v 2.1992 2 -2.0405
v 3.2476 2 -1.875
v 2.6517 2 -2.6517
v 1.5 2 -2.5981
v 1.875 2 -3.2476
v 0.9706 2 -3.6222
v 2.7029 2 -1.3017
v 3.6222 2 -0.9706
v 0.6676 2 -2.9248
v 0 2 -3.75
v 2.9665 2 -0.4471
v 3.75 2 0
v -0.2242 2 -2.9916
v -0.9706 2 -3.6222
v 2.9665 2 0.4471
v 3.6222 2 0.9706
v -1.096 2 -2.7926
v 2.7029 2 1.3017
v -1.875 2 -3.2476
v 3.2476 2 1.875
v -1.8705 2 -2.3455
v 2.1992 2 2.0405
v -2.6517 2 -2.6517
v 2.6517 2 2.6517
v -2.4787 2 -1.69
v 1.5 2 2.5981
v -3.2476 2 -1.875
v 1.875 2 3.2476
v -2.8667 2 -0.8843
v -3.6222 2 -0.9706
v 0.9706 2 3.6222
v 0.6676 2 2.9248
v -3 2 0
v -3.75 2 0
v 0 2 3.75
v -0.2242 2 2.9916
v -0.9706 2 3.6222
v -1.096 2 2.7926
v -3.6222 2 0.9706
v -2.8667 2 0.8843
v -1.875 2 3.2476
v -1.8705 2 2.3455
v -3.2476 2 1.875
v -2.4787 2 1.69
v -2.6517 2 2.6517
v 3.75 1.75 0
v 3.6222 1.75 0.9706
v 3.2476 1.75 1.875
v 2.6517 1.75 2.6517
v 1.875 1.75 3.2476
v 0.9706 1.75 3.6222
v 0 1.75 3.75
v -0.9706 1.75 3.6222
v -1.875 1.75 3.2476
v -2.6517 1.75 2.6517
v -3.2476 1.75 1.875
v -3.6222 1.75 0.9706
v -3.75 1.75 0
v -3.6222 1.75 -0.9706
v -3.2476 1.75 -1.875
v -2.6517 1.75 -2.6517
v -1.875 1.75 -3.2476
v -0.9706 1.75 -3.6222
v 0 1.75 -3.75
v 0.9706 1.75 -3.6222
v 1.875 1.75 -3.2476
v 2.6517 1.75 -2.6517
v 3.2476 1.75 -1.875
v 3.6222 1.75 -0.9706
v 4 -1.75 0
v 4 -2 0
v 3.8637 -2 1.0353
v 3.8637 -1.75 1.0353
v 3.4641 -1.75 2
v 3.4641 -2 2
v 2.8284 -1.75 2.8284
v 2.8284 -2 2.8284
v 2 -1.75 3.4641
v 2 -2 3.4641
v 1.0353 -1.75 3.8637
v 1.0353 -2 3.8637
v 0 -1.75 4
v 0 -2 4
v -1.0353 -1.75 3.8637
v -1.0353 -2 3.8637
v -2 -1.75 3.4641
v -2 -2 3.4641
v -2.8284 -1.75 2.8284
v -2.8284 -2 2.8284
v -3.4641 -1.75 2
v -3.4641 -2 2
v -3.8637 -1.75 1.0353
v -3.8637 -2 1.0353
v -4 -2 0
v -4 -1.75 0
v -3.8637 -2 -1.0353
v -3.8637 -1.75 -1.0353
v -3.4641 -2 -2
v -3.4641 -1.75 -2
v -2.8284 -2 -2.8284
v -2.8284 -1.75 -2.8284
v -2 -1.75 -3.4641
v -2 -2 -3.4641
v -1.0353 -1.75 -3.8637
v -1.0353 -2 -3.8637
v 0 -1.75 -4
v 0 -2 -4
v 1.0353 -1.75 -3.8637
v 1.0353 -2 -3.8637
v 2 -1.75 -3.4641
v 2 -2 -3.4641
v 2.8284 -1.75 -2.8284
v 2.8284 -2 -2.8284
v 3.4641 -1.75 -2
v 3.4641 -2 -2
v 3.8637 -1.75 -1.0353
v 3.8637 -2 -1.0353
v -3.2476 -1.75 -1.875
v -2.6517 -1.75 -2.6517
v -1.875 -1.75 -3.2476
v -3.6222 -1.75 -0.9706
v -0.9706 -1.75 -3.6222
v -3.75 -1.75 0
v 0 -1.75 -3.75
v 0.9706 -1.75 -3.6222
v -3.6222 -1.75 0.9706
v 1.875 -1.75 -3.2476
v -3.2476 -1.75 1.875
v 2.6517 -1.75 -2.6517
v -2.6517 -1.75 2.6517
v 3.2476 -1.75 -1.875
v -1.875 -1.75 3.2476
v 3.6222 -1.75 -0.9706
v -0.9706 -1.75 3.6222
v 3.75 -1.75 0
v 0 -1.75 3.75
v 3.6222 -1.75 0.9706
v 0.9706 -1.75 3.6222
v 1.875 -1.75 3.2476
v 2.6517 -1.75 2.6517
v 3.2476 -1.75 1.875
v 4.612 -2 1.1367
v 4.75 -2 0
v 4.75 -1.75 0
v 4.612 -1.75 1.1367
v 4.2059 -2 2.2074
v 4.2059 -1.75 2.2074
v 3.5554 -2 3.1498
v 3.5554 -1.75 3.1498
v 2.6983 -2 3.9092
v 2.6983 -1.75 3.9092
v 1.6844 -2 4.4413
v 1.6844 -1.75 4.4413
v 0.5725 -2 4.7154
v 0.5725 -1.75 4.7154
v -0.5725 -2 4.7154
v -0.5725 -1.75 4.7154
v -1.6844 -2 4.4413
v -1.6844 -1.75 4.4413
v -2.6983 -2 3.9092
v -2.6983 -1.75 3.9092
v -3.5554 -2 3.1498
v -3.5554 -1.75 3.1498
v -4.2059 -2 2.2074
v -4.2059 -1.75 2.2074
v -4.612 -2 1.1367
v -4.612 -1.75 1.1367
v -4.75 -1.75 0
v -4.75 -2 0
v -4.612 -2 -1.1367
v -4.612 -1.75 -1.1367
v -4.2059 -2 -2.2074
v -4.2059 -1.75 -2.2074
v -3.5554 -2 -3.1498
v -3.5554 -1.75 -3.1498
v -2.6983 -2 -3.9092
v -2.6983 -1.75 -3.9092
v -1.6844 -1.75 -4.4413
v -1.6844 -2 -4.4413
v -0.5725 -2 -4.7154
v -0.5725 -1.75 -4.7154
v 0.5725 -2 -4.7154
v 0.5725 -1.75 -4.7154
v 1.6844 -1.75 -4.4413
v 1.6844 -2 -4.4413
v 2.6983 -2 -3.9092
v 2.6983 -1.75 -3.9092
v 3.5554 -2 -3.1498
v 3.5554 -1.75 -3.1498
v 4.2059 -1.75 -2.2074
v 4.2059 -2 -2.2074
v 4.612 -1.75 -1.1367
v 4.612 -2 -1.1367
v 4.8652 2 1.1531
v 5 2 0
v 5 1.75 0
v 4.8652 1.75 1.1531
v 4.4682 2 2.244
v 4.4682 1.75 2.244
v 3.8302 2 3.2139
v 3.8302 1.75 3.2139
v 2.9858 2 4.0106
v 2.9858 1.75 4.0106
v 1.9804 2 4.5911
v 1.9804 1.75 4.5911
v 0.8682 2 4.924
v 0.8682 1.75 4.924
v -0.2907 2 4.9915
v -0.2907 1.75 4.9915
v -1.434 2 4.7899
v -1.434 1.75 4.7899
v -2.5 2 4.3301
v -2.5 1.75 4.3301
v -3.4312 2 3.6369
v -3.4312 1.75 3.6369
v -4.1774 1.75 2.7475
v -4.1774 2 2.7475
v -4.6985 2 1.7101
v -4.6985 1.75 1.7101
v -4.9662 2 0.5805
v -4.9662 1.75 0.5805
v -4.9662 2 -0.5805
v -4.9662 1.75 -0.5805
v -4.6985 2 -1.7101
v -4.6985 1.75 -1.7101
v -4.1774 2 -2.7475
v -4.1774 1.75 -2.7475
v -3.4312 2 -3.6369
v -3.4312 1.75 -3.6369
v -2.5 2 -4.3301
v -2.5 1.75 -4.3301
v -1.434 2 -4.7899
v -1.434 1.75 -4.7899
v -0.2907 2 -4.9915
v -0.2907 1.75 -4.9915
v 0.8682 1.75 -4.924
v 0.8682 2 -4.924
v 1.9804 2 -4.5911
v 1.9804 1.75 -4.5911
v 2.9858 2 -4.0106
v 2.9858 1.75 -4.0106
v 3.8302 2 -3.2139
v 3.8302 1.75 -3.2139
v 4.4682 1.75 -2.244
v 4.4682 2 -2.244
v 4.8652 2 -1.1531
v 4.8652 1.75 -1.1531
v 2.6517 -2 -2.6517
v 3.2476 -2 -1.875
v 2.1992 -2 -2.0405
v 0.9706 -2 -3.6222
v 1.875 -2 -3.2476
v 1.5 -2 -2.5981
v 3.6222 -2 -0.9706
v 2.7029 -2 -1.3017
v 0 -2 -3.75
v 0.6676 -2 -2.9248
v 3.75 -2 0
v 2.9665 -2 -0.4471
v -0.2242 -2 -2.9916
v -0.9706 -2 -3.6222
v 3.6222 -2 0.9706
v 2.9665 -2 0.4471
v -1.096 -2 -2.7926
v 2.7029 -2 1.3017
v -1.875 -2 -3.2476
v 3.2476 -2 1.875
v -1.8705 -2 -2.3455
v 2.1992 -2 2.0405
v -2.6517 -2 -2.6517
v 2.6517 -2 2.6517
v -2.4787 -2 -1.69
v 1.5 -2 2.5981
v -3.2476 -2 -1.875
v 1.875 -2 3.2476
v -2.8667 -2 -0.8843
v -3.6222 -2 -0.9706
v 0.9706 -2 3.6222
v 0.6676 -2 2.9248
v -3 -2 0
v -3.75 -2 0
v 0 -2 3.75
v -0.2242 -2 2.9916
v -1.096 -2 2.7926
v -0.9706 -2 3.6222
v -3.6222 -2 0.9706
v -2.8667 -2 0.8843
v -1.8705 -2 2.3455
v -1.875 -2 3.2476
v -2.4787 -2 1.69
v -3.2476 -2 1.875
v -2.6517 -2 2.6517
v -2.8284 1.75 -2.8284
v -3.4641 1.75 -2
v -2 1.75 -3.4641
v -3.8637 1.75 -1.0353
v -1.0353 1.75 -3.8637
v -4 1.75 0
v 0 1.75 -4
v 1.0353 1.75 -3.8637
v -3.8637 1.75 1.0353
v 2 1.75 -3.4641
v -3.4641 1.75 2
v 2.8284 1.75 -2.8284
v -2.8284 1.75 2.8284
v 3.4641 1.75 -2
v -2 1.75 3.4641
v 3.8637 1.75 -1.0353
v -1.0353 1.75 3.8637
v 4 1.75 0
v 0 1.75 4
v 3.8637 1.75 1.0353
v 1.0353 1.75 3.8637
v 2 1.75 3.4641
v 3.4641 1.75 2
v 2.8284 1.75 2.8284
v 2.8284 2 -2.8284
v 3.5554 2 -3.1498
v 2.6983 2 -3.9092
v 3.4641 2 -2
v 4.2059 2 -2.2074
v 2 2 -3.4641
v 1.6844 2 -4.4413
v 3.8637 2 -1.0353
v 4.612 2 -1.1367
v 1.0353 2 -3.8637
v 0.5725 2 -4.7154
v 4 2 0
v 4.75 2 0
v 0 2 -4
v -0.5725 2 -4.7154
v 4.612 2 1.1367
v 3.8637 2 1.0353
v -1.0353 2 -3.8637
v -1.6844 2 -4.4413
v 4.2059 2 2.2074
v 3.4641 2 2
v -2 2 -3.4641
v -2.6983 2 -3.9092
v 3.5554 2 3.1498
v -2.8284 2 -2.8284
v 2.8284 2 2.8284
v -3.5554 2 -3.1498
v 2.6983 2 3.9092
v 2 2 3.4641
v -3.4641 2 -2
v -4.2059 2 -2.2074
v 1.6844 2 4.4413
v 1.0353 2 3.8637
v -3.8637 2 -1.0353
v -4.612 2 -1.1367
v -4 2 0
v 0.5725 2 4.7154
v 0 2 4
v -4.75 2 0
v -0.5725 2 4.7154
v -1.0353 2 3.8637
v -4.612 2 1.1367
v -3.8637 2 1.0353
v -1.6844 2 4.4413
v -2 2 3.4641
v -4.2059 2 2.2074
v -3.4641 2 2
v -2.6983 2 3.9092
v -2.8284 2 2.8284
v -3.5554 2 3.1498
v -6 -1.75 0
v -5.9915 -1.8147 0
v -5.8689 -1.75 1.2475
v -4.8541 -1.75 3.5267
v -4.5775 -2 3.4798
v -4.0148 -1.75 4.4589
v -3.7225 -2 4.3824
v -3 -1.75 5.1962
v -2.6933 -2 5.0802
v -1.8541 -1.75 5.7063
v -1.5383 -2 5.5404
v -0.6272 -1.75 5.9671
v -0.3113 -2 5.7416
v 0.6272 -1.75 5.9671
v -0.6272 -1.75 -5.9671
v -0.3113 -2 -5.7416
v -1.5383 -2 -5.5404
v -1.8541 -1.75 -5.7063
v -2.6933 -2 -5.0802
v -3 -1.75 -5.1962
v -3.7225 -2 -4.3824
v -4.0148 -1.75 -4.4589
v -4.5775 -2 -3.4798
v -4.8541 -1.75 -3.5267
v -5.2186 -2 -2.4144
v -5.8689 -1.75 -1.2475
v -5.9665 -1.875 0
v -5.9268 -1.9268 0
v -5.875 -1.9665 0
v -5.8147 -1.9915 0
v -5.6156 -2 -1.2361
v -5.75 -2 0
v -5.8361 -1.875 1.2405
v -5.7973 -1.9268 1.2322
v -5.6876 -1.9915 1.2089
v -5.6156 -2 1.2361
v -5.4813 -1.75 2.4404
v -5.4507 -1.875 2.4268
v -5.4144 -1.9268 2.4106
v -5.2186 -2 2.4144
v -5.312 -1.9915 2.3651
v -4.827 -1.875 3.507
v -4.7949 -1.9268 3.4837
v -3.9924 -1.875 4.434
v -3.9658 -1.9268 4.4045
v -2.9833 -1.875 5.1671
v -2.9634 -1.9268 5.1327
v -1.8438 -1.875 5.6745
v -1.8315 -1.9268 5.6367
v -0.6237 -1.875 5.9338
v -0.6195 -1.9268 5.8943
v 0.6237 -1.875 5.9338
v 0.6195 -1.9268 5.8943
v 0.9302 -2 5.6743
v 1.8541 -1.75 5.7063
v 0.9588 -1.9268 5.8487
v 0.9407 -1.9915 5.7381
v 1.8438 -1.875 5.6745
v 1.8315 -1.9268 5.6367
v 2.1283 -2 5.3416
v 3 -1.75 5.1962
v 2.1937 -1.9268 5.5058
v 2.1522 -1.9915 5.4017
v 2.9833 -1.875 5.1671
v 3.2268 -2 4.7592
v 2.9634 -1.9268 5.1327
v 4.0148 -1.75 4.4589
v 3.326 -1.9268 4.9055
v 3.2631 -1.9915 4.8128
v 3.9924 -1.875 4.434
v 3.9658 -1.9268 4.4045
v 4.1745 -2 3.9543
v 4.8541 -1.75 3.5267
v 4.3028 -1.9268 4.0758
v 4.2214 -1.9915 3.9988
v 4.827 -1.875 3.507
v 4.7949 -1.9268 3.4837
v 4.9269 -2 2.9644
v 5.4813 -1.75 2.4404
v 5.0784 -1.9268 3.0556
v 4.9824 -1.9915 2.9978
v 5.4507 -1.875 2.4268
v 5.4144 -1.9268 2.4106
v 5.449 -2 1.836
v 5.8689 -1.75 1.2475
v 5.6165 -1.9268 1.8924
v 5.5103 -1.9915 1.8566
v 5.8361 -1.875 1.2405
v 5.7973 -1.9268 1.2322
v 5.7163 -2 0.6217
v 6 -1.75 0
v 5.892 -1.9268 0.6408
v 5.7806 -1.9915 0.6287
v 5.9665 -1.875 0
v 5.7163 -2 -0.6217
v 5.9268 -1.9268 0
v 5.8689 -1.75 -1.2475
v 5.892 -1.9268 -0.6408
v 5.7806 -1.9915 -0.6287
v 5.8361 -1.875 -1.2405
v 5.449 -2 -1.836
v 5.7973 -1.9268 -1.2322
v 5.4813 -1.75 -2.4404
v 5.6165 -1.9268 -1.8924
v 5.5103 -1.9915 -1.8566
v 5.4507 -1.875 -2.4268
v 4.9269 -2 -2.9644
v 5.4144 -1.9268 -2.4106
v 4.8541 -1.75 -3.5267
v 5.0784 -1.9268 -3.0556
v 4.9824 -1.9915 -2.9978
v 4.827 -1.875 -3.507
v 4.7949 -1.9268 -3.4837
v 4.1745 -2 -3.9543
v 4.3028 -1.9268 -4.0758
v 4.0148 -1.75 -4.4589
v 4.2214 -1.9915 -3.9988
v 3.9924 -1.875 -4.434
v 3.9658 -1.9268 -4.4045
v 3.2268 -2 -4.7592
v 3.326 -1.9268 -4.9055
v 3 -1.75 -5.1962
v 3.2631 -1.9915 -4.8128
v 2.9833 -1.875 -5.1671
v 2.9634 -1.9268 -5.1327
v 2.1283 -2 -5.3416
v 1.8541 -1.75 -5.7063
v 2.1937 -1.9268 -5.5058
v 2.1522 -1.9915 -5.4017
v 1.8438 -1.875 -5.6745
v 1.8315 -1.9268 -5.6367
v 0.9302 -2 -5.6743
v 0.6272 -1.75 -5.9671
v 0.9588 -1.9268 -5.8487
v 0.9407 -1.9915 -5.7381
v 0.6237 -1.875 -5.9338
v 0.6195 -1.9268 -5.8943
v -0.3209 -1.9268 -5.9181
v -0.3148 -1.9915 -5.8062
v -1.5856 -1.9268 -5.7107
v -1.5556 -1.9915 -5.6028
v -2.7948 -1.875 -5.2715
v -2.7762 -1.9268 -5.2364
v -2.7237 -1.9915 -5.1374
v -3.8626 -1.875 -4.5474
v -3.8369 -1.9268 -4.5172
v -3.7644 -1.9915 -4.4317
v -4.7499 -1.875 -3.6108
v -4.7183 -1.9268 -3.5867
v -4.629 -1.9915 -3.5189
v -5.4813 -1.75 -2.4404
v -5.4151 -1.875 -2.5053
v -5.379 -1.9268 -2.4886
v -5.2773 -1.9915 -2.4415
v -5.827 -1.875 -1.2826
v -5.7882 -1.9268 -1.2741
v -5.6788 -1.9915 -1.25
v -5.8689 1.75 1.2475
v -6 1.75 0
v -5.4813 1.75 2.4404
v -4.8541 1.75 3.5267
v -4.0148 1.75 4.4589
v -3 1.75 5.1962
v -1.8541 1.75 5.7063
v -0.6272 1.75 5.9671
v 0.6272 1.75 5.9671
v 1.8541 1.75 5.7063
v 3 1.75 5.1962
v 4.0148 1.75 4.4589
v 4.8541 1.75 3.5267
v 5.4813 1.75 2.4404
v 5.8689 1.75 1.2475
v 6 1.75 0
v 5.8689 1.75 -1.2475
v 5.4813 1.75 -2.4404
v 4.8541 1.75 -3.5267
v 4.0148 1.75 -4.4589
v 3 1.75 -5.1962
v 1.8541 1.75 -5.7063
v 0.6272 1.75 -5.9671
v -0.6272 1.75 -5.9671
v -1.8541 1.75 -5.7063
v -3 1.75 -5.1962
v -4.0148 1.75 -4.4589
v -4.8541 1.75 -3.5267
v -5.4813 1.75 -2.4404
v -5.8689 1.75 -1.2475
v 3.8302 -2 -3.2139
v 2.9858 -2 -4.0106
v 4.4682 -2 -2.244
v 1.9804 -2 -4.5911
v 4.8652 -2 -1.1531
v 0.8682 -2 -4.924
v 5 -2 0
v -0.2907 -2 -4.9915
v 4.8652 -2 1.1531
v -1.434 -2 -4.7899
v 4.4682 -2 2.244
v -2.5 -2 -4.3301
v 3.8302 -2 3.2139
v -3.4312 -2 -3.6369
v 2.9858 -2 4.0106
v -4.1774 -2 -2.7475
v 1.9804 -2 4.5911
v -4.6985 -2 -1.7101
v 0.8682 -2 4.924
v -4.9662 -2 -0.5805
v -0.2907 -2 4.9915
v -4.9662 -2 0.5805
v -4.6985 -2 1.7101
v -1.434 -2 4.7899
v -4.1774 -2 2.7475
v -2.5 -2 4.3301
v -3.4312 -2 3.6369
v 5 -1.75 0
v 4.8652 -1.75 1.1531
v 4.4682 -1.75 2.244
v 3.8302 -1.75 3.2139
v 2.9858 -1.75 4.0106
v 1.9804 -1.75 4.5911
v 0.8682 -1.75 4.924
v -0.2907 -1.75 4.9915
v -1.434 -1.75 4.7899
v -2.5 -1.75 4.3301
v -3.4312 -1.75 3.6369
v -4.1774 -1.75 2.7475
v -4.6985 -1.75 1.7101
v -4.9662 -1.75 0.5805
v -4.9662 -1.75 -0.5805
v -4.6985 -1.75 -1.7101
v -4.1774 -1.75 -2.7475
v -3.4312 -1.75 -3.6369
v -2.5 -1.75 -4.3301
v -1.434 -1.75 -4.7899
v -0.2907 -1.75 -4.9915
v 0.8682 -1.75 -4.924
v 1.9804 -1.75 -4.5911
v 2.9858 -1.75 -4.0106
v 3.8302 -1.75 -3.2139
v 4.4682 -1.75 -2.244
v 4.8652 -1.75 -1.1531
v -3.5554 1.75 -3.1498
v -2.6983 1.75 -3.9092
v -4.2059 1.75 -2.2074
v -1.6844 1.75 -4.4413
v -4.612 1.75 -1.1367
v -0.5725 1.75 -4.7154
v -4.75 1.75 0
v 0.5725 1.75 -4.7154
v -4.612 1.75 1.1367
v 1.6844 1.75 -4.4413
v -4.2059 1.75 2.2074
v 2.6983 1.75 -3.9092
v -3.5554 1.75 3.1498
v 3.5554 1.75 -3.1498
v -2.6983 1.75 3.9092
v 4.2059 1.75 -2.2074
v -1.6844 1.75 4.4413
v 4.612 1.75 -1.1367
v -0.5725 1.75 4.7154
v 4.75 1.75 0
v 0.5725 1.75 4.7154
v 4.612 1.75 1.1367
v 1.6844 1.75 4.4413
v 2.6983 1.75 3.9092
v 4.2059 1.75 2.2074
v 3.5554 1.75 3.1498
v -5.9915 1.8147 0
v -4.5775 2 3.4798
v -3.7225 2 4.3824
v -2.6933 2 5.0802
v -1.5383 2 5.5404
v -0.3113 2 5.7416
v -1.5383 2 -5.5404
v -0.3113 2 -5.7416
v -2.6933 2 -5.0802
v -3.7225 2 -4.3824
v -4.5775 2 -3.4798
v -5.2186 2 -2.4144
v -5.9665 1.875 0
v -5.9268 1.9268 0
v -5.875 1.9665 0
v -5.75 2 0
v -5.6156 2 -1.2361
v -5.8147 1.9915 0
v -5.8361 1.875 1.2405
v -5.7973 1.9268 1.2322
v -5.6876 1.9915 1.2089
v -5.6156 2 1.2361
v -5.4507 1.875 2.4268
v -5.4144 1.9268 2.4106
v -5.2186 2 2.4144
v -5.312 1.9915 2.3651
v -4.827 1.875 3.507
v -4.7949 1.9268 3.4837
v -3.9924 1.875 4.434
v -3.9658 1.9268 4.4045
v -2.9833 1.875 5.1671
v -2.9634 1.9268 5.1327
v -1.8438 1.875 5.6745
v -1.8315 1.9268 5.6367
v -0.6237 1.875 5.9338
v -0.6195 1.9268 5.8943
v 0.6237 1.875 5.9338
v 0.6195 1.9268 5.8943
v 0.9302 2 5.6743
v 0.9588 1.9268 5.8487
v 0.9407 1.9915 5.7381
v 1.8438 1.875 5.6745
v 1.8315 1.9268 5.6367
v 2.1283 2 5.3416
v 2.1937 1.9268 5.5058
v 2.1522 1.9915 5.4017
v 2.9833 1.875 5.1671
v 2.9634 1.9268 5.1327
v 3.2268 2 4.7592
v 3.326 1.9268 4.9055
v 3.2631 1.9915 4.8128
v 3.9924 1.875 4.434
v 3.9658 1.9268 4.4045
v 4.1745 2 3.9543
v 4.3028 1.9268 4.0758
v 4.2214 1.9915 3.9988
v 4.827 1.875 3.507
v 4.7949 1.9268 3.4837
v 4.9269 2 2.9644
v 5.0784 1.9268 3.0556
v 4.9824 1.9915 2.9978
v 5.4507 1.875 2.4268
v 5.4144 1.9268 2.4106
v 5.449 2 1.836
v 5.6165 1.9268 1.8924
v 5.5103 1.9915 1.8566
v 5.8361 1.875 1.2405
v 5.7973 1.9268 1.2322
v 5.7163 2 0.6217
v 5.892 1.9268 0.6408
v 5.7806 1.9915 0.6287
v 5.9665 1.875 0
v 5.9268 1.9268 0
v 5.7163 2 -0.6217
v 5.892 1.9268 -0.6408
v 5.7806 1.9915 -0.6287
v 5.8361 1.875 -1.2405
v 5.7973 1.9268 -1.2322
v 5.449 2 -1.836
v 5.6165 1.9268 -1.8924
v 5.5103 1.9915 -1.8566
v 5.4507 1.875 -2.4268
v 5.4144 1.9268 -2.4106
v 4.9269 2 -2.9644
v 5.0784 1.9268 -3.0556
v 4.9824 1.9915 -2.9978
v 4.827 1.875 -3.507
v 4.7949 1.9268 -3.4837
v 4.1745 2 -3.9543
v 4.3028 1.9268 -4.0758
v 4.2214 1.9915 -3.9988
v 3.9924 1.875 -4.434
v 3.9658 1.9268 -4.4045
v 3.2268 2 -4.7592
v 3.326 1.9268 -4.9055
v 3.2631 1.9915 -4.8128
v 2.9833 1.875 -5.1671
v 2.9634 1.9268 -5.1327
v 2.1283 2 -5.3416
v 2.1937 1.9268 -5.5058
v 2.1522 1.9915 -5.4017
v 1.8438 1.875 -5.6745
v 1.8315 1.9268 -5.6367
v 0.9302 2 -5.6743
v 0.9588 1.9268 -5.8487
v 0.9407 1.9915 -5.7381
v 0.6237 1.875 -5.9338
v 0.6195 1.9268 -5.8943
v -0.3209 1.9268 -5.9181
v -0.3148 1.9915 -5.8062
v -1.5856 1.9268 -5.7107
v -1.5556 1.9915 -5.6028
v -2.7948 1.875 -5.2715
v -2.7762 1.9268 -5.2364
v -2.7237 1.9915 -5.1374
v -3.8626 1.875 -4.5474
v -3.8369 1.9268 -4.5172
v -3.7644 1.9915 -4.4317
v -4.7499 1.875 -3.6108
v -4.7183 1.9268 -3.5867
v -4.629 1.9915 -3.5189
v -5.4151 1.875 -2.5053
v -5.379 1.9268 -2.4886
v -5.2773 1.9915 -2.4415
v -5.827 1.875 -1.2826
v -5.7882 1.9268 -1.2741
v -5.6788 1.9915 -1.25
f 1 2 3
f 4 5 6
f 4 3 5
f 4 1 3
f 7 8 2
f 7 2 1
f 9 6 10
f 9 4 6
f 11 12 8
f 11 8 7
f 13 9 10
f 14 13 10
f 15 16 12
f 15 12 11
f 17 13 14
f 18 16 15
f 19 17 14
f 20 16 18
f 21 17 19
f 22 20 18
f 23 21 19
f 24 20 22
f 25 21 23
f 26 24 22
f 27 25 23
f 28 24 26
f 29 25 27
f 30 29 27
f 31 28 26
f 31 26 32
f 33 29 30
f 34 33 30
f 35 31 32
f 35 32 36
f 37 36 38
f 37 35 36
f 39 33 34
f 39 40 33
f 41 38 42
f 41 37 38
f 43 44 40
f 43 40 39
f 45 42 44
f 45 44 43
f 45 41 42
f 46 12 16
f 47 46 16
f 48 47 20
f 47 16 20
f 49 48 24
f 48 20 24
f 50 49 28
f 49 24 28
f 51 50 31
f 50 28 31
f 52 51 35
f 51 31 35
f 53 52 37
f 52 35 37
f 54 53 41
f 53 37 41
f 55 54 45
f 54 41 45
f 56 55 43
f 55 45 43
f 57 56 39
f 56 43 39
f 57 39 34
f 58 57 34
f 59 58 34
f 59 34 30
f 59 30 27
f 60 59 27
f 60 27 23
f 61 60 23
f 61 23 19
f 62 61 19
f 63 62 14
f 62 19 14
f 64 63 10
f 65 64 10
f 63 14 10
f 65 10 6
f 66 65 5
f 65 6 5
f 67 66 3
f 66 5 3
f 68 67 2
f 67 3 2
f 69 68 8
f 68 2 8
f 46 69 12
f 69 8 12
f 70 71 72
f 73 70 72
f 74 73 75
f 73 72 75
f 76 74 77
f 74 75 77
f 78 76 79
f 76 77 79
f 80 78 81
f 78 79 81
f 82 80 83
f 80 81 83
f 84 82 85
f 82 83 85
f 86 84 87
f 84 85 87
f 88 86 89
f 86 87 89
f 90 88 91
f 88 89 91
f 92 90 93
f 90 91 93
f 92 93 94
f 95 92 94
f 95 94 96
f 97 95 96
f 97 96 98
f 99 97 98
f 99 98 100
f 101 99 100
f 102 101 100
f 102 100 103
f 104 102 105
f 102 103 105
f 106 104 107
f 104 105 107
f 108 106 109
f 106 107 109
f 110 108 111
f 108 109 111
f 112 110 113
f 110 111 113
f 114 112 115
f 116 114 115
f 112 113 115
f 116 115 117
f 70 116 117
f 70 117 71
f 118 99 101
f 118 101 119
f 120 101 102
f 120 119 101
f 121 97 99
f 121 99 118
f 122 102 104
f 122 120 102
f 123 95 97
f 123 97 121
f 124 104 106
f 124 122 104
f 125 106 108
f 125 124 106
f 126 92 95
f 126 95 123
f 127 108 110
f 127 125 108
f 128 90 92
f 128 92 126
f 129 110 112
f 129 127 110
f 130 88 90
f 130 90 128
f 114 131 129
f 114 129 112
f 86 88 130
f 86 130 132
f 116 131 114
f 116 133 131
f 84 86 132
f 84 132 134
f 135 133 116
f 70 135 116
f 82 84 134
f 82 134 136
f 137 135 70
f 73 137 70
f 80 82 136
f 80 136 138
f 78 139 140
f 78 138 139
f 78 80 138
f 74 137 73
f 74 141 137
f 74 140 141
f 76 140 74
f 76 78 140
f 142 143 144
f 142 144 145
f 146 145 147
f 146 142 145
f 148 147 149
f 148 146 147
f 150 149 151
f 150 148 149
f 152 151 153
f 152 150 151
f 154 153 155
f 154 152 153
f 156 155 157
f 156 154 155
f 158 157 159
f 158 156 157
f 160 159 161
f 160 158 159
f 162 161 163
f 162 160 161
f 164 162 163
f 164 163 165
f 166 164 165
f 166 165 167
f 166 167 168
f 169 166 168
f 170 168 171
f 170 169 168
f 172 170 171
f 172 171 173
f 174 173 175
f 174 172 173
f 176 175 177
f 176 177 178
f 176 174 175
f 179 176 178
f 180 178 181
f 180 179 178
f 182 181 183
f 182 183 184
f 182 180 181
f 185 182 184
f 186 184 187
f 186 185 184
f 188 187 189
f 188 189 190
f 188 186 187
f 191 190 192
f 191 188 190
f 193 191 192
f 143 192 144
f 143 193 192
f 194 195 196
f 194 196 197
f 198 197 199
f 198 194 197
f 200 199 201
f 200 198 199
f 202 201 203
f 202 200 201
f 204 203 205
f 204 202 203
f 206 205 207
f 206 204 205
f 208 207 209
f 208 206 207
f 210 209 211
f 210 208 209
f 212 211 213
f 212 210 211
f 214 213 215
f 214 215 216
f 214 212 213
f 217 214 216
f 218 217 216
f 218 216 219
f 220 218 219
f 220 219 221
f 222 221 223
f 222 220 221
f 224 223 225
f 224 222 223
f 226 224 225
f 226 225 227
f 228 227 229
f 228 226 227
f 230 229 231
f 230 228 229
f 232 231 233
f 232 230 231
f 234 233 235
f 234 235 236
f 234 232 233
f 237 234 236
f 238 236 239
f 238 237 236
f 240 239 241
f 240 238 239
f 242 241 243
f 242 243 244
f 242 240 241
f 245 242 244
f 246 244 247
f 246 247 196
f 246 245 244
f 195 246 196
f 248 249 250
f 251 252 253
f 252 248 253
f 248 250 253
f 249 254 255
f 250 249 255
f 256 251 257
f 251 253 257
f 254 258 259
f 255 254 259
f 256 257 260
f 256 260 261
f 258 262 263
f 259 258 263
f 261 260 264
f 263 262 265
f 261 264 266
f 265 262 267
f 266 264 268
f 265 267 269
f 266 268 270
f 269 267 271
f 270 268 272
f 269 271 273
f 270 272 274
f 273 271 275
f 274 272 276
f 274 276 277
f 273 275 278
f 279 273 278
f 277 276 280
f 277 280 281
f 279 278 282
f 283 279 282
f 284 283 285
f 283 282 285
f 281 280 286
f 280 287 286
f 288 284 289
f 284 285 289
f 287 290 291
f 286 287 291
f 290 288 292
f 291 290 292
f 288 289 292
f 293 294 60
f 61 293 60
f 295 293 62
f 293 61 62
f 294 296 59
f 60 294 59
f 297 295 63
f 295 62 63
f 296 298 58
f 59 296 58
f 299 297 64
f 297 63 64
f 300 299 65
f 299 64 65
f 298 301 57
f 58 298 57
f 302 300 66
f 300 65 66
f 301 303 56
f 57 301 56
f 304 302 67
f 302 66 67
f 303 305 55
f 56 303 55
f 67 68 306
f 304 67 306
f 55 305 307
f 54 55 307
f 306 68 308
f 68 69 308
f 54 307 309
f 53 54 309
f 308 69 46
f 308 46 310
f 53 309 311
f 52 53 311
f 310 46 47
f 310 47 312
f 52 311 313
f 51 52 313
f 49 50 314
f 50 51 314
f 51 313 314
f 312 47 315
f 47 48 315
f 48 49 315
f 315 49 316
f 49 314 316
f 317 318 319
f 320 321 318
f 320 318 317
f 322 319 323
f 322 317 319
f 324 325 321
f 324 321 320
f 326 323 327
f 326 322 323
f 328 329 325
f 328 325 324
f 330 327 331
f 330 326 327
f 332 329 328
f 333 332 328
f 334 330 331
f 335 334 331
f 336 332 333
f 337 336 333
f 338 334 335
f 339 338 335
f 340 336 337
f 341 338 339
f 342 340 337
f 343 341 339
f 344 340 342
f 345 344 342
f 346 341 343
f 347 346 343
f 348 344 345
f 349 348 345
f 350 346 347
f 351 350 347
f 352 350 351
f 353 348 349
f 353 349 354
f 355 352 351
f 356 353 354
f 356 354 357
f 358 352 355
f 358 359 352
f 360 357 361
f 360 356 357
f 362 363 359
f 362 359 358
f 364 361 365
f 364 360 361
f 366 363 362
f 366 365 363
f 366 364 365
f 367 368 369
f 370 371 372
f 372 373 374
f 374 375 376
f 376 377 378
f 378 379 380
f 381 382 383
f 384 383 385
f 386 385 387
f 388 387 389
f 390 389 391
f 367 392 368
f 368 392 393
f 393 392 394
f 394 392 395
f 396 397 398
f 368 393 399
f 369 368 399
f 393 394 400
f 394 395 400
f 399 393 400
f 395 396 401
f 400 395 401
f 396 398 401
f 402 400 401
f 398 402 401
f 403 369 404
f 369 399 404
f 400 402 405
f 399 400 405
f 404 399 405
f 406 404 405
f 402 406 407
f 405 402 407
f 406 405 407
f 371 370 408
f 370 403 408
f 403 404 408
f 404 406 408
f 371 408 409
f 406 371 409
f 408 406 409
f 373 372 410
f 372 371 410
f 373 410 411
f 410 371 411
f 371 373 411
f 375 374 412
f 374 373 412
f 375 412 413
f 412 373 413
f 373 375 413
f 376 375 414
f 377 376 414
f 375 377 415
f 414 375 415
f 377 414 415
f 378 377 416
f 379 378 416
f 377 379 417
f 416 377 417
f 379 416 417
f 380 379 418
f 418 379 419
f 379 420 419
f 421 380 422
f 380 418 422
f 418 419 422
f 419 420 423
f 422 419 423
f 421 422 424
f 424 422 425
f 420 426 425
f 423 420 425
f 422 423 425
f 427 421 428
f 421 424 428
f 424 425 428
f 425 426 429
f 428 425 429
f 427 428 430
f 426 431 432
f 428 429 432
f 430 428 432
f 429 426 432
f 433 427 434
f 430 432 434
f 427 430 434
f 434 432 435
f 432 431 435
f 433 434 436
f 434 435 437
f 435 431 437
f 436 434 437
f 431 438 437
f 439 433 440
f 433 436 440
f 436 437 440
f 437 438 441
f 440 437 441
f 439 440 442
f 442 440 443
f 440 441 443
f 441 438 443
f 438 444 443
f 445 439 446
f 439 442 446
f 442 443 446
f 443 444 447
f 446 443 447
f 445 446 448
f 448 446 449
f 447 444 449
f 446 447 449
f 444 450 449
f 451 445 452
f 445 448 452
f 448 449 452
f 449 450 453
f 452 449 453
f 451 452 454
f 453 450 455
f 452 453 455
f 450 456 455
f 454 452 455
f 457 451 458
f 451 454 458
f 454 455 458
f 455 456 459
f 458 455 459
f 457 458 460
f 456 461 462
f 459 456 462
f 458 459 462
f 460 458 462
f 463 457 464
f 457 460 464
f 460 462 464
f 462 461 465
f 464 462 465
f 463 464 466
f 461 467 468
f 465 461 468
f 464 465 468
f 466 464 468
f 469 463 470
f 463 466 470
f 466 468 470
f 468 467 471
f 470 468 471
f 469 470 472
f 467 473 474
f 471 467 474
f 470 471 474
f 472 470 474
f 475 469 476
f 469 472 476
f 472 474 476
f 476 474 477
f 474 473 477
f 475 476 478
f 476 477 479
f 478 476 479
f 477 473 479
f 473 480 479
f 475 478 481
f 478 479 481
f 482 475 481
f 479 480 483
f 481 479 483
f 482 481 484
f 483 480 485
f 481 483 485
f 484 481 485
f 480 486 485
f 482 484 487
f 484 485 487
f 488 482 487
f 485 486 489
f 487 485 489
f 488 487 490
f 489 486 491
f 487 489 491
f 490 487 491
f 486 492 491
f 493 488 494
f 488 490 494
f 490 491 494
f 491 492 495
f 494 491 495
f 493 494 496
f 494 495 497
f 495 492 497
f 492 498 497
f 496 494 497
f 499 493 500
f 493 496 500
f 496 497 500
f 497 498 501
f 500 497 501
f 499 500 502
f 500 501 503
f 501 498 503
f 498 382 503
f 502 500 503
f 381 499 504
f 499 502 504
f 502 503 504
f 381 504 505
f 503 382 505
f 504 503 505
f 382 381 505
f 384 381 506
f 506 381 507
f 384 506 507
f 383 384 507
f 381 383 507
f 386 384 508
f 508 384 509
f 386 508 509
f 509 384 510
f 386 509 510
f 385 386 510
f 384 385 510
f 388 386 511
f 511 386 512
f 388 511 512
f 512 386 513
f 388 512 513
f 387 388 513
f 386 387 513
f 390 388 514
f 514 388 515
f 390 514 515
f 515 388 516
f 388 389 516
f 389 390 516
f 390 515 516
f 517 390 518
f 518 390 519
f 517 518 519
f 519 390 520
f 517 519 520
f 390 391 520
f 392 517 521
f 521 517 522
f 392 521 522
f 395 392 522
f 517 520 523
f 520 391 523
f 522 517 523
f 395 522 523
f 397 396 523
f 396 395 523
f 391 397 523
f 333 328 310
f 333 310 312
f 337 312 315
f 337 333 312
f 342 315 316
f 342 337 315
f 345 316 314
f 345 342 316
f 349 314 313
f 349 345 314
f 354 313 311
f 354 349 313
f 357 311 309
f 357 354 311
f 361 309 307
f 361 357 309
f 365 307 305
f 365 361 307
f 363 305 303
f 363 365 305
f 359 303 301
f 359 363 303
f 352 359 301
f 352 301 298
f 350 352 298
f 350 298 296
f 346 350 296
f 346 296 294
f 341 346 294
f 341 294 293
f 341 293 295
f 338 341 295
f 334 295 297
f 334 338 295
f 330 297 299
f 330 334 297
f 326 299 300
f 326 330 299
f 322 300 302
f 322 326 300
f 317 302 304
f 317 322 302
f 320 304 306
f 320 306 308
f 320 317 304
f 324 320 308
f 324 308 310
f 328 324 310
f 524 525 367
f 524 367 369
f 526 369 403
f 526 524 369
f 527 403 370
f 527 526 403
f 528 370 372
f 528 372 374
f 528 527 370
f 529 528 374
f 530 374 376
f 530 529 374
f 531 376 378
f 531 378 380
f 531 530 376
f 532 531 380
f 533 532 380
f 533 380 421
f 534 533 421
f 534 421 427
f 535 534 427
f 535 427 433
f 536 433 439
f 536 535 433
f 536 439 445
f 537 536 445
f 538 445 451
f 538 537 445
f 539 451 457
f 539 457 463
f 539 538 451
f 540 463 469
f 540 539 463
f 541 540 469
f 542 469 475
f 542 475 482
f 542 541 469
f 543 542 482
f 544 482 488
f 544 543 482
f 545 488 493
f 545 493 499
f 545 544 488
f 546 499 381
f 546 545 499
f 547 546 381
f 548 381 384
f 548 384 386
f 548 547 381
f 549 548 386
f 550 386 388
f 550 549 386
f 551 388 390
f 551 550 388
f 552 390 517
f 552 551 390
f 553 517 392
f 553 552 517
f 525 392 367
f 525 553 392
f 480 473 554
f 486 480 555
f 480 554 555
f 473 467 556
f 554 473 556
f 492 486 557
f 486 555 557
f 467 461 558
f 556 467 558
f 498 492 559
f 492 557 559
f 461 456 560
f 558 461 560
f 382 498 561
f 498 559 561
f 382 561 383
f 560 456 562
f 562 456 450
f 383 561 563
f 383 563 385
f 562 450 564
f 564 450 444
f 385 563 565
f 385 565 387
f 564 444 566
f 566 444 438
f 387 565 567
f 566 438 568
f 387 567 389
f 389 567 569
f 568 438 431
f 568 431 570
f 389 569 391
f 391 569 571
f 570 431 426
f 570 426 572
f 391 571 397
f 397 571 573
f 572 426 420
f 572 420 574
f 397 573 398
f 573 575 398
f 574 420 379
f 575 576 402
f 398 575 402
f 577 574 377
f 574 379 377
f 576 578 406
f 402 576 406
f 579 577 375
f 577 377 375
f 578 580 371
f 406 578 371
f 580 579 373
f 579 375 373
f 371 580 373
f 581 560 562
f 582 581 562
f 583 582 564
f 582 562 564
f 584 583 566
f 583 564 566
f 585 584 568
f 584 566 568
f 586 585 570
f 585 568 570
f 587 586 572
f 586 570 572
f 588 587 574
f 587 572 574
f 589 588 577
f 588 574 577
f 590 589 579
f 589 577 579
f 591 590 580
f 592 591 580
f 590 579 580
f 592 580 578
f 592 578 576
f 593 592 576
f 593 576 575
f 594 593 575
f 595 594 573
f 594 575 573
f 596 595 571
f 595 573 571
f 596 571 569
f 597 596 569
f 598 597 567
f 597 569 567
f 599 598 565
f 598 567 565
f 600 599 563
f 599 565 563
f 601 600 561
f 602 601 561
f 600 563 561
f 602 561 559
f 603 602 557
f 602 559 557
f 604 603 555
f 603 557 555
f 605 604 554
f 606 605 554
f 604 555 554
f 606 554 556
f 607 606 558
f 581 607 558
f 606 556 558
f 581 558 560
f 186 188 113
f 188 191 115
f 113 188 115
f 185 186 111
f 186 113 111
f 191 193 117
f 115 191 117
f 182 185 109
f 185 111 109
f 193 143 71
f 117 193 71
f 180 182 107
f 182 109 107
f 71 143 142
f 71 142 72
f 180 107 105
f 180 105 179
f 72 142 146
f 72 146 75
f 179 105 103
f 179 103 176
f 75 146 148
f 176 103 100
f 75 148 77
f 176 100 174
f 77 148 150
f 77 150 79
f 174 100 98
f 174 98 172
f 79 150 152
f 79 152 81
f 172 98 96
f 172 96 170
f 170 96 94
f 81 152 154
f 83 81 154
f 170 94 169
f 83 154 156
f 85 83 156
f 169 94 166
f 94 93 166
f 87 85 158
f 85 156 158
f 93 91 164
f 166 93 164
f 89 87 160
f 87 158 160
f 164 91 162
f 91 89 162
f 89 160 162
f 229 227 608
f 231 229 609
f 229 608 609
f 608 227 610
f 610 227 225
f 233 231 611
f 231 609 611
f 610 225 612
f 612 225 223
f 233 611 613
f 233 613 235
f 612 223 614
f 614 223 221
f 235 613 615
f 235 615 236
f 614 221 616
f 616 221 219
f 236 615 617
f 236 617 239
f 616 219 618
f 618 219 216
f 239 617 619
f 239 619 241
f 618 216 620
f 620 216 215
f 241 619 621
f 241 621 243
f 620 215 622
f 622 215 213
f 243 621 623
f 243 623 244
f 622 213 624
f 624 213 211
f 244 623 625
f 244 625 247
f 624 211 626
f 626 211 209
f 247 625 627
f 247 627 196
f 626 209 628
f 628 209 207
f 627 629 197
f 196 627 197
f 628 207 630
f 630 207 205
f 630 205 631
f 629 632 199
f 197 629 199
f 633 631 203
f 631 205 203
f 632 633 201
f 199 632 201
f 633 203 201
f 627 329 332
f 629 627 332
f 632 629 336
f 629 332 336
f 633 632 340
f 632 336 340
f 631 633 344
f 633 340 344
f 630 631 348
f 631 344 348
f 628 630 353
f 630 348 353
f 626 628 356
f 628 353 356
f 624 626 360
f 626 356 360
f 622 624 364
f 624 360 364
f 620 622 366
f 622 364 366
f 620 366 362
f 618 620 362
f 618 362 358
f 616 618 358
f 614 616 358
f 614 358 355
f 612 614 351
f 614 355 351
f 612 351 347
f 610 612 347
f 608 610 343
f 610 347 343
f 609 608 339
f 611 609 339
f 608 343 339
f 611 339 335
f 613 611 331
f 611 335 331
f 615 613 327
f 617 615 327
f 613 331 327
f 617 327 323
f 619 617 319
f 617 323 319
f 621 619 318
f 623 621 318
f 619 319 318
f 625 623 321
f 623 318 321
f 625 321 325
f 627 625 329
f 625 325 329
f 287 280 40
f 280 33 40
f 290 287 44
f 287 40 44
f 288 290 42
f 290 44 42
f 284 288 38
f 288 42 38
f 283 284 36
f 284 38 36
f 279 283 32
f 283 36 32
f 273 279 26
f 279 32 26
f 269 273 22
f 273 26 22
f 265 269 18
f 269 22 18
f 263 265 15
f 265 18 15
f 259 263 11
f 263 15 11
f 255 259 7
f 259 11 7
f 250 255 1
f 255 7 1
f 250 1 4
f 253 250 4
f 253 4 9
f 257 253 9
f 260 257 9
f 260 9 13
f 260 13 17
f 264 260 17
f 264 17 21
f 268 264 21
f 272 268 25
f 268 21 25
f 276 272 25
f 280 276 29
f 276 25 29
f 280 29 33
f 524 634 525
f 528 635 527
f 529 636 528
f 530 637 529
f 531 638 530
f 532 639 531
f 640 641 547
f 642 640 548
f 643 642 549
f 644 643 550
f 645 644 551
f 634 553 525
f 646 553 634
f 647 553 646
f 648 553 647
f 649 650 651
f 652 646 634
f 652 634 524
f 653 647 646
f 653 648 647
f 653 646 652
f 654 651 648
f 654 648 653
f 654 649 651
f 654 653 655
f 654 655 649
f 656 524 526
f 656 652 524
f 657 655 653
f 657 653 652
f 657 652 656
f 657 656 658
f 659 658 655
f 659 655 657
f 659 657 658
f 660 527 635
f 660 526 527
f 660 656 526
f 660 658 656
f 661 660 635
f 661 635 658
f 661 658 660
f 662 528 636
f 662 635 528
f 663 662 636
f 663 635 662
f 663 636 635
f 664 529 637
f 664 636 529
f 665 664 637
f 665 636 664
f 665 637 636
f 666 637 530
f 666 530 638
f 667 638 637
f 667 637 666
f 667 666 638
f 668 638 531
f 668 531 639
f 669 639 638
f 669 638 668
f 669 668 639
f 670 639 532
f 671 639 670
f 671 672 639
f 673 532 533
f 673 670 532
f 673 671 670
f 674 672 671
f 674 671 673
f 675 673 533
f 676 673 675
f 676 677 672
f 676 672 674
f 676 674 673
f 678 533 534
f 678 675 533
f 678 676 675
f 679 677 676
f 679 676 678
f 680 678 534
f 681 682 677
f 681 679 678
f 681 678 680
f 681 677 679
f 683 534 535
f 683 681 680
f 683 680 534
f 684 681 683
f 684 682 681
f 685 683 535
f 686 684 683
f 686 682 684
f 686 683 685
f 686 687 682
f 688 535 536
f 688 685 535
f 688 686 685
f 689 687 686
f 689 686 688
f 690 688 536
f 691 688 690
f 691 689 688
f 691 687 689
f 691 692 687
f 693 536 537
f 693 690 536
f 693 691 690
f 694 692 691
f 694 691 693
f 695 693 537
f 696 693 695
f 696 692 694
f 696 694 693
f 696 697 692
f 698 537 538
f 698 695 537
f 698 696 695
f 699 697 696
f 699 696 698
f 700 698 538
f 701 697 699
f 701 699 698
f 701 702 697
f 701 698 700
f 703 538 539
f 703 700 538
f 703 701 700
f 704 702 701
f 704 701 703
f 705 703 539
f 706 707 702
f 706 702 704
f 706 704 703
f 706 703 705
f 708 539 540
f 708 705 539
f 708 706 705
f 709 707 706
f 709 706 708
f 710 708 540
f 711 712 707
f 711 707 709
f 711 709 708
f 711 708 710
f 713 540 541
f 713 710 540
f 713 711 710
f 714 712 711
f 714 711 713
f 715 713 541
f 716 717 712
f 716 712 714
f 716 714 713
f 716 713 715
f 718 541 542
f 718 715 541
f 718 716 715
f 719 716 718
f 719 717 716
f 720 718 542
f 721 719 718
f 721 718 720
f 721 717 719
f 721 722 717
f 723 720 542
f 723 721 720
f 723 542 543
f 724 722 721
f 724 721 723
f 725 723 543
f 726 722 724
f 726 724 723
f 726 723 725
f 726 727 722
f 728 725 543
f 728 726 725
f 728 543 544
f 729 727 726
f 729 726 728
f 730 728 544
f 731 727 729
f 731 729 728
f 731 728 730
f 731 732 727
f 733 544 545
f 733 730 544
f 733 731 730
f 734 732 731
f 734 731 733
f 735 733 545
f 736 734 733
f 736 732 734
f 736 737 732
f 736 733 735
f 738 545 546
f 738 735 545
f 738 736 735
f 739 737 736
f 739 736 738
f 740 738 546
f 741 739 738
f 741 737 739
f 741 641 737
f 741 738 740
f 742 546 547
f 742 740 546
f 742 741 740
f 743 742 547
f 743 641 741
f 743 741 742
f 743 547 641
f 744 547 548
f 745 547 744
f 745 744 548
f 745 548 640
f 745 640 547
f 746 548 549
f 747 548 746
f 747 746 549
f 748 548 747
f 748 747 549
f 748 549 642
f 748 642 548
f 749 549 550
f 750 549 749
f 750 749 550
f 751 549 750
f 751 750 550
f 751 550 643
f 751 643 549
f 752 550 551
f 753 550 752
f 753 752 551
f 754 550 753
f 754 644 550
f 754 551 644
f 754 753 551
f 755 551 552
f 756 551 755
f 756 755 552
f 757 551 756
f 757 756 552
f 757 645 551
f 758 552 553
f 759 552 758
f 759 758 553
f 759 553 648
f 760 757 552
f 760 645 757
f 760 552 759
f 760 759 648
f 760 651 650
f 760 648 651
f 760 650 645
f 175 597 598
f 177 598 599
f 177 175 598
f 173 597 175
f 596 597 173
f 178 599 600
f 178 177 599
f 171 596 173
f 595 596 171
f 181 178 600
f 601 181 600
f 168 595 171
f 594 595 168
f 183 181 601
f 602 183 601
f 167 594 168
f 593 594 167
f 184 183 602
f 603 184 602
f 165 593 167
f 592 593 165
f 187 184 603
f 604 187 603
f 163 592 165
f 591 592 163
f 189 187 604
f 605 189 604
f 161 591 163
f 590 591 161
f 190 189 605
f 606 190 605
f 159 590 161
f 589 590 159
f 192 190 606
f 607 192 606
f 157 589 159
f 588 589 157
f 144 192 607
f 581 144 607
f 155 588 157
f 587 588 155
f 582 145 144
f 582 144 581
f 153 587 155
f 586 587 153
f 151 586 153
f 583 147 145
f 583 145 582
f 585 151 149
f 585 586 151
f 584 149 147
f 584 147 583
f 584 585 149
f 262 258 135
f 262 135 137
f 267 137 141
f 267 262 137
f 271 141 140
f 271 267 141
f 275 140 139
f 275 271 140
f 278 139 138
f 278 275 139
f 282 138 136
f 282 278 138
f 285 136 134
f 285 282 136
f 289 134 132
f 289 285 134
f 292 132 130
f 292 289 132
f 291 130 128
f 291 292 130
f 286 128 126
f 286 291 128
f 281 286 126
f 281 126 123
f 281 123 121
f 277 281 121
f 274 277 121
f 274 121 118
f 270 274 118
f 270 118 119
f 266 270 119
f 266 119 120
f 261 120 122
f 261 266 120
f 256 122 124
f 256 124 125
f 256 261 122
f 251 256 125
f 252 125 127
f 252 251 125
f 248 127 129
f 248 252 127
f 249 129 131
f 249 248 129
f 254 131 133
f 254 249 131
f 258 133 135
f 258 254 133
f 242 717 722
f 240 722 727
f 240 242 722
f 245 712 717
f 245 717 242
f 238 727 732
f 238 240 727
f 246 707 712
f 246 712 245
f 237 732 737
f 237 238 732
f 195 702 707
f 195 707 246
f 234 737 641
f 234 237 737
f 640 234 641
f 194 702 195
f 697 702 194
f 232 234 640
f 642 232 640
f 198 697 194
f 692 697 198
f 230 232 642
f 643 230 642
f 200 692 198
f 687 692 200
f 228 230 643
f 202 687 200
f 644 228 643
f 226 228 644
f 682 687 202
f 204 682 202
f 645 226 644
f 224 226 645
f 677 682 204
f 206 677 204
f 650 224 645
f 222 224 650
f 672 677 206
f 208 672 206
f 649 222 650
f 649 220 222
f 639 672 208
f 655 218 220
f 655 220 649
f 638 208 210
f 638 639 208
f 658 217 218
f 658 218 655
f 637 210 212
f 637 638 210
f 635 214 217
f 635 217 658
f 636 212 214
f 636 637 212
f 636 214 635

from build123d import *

# Parameters (mm, degrees)
F0_W     = 3
F0_H     = 4
F2_R     = 5
F2_R_2   = 4.75
F2_R_3   = 4
F2_R_4   = 3.75
F3_DEPTH = 0.25
F4_R     = 0.25


# Not quite as in the source:
# - a pattern or mirror of a feature is missing from the dataset's text; its kind, count and spacing are read off the source's solid


with BuildPart() as f1:
    # F0 (on Top) → F1 (revolve)
    with BuildSketch(Plane.XY):
        with Locations((-4.5, 0)):
            Rectangle(F0_W, F0_H)
    revolve(axis=Axis((0, 8.2013355568, 0), (0, 1, 0)))

    # F2 (on face) → F3 (cut)
    with BuildSketch(Plane.XZ.offset(2)):
        Circle(F2_R)
        Circle(F2_R_2, mode=Mode.SUBTRACT)
        Circle(F2_R_3)
        Circle(F2_R_4, mode=Mode.SUBTRACT)
    f3 = extrude(amount=-F3_DEPTH, mode=Mode.SUBTRACT)

    # F3_copies: F3 across plane
    add(f3.mirror(Plane.ZX), mode=Mode.SUBTRACT)

    # F4
    f4_edges = [f1.edges().sort_by_distance(p)[0] for p in [
        (6, -2, 0),
        (6, 2, 0),
    ]]
    fillet(f4_edges, radius=F4_R)


solid = f1.part
